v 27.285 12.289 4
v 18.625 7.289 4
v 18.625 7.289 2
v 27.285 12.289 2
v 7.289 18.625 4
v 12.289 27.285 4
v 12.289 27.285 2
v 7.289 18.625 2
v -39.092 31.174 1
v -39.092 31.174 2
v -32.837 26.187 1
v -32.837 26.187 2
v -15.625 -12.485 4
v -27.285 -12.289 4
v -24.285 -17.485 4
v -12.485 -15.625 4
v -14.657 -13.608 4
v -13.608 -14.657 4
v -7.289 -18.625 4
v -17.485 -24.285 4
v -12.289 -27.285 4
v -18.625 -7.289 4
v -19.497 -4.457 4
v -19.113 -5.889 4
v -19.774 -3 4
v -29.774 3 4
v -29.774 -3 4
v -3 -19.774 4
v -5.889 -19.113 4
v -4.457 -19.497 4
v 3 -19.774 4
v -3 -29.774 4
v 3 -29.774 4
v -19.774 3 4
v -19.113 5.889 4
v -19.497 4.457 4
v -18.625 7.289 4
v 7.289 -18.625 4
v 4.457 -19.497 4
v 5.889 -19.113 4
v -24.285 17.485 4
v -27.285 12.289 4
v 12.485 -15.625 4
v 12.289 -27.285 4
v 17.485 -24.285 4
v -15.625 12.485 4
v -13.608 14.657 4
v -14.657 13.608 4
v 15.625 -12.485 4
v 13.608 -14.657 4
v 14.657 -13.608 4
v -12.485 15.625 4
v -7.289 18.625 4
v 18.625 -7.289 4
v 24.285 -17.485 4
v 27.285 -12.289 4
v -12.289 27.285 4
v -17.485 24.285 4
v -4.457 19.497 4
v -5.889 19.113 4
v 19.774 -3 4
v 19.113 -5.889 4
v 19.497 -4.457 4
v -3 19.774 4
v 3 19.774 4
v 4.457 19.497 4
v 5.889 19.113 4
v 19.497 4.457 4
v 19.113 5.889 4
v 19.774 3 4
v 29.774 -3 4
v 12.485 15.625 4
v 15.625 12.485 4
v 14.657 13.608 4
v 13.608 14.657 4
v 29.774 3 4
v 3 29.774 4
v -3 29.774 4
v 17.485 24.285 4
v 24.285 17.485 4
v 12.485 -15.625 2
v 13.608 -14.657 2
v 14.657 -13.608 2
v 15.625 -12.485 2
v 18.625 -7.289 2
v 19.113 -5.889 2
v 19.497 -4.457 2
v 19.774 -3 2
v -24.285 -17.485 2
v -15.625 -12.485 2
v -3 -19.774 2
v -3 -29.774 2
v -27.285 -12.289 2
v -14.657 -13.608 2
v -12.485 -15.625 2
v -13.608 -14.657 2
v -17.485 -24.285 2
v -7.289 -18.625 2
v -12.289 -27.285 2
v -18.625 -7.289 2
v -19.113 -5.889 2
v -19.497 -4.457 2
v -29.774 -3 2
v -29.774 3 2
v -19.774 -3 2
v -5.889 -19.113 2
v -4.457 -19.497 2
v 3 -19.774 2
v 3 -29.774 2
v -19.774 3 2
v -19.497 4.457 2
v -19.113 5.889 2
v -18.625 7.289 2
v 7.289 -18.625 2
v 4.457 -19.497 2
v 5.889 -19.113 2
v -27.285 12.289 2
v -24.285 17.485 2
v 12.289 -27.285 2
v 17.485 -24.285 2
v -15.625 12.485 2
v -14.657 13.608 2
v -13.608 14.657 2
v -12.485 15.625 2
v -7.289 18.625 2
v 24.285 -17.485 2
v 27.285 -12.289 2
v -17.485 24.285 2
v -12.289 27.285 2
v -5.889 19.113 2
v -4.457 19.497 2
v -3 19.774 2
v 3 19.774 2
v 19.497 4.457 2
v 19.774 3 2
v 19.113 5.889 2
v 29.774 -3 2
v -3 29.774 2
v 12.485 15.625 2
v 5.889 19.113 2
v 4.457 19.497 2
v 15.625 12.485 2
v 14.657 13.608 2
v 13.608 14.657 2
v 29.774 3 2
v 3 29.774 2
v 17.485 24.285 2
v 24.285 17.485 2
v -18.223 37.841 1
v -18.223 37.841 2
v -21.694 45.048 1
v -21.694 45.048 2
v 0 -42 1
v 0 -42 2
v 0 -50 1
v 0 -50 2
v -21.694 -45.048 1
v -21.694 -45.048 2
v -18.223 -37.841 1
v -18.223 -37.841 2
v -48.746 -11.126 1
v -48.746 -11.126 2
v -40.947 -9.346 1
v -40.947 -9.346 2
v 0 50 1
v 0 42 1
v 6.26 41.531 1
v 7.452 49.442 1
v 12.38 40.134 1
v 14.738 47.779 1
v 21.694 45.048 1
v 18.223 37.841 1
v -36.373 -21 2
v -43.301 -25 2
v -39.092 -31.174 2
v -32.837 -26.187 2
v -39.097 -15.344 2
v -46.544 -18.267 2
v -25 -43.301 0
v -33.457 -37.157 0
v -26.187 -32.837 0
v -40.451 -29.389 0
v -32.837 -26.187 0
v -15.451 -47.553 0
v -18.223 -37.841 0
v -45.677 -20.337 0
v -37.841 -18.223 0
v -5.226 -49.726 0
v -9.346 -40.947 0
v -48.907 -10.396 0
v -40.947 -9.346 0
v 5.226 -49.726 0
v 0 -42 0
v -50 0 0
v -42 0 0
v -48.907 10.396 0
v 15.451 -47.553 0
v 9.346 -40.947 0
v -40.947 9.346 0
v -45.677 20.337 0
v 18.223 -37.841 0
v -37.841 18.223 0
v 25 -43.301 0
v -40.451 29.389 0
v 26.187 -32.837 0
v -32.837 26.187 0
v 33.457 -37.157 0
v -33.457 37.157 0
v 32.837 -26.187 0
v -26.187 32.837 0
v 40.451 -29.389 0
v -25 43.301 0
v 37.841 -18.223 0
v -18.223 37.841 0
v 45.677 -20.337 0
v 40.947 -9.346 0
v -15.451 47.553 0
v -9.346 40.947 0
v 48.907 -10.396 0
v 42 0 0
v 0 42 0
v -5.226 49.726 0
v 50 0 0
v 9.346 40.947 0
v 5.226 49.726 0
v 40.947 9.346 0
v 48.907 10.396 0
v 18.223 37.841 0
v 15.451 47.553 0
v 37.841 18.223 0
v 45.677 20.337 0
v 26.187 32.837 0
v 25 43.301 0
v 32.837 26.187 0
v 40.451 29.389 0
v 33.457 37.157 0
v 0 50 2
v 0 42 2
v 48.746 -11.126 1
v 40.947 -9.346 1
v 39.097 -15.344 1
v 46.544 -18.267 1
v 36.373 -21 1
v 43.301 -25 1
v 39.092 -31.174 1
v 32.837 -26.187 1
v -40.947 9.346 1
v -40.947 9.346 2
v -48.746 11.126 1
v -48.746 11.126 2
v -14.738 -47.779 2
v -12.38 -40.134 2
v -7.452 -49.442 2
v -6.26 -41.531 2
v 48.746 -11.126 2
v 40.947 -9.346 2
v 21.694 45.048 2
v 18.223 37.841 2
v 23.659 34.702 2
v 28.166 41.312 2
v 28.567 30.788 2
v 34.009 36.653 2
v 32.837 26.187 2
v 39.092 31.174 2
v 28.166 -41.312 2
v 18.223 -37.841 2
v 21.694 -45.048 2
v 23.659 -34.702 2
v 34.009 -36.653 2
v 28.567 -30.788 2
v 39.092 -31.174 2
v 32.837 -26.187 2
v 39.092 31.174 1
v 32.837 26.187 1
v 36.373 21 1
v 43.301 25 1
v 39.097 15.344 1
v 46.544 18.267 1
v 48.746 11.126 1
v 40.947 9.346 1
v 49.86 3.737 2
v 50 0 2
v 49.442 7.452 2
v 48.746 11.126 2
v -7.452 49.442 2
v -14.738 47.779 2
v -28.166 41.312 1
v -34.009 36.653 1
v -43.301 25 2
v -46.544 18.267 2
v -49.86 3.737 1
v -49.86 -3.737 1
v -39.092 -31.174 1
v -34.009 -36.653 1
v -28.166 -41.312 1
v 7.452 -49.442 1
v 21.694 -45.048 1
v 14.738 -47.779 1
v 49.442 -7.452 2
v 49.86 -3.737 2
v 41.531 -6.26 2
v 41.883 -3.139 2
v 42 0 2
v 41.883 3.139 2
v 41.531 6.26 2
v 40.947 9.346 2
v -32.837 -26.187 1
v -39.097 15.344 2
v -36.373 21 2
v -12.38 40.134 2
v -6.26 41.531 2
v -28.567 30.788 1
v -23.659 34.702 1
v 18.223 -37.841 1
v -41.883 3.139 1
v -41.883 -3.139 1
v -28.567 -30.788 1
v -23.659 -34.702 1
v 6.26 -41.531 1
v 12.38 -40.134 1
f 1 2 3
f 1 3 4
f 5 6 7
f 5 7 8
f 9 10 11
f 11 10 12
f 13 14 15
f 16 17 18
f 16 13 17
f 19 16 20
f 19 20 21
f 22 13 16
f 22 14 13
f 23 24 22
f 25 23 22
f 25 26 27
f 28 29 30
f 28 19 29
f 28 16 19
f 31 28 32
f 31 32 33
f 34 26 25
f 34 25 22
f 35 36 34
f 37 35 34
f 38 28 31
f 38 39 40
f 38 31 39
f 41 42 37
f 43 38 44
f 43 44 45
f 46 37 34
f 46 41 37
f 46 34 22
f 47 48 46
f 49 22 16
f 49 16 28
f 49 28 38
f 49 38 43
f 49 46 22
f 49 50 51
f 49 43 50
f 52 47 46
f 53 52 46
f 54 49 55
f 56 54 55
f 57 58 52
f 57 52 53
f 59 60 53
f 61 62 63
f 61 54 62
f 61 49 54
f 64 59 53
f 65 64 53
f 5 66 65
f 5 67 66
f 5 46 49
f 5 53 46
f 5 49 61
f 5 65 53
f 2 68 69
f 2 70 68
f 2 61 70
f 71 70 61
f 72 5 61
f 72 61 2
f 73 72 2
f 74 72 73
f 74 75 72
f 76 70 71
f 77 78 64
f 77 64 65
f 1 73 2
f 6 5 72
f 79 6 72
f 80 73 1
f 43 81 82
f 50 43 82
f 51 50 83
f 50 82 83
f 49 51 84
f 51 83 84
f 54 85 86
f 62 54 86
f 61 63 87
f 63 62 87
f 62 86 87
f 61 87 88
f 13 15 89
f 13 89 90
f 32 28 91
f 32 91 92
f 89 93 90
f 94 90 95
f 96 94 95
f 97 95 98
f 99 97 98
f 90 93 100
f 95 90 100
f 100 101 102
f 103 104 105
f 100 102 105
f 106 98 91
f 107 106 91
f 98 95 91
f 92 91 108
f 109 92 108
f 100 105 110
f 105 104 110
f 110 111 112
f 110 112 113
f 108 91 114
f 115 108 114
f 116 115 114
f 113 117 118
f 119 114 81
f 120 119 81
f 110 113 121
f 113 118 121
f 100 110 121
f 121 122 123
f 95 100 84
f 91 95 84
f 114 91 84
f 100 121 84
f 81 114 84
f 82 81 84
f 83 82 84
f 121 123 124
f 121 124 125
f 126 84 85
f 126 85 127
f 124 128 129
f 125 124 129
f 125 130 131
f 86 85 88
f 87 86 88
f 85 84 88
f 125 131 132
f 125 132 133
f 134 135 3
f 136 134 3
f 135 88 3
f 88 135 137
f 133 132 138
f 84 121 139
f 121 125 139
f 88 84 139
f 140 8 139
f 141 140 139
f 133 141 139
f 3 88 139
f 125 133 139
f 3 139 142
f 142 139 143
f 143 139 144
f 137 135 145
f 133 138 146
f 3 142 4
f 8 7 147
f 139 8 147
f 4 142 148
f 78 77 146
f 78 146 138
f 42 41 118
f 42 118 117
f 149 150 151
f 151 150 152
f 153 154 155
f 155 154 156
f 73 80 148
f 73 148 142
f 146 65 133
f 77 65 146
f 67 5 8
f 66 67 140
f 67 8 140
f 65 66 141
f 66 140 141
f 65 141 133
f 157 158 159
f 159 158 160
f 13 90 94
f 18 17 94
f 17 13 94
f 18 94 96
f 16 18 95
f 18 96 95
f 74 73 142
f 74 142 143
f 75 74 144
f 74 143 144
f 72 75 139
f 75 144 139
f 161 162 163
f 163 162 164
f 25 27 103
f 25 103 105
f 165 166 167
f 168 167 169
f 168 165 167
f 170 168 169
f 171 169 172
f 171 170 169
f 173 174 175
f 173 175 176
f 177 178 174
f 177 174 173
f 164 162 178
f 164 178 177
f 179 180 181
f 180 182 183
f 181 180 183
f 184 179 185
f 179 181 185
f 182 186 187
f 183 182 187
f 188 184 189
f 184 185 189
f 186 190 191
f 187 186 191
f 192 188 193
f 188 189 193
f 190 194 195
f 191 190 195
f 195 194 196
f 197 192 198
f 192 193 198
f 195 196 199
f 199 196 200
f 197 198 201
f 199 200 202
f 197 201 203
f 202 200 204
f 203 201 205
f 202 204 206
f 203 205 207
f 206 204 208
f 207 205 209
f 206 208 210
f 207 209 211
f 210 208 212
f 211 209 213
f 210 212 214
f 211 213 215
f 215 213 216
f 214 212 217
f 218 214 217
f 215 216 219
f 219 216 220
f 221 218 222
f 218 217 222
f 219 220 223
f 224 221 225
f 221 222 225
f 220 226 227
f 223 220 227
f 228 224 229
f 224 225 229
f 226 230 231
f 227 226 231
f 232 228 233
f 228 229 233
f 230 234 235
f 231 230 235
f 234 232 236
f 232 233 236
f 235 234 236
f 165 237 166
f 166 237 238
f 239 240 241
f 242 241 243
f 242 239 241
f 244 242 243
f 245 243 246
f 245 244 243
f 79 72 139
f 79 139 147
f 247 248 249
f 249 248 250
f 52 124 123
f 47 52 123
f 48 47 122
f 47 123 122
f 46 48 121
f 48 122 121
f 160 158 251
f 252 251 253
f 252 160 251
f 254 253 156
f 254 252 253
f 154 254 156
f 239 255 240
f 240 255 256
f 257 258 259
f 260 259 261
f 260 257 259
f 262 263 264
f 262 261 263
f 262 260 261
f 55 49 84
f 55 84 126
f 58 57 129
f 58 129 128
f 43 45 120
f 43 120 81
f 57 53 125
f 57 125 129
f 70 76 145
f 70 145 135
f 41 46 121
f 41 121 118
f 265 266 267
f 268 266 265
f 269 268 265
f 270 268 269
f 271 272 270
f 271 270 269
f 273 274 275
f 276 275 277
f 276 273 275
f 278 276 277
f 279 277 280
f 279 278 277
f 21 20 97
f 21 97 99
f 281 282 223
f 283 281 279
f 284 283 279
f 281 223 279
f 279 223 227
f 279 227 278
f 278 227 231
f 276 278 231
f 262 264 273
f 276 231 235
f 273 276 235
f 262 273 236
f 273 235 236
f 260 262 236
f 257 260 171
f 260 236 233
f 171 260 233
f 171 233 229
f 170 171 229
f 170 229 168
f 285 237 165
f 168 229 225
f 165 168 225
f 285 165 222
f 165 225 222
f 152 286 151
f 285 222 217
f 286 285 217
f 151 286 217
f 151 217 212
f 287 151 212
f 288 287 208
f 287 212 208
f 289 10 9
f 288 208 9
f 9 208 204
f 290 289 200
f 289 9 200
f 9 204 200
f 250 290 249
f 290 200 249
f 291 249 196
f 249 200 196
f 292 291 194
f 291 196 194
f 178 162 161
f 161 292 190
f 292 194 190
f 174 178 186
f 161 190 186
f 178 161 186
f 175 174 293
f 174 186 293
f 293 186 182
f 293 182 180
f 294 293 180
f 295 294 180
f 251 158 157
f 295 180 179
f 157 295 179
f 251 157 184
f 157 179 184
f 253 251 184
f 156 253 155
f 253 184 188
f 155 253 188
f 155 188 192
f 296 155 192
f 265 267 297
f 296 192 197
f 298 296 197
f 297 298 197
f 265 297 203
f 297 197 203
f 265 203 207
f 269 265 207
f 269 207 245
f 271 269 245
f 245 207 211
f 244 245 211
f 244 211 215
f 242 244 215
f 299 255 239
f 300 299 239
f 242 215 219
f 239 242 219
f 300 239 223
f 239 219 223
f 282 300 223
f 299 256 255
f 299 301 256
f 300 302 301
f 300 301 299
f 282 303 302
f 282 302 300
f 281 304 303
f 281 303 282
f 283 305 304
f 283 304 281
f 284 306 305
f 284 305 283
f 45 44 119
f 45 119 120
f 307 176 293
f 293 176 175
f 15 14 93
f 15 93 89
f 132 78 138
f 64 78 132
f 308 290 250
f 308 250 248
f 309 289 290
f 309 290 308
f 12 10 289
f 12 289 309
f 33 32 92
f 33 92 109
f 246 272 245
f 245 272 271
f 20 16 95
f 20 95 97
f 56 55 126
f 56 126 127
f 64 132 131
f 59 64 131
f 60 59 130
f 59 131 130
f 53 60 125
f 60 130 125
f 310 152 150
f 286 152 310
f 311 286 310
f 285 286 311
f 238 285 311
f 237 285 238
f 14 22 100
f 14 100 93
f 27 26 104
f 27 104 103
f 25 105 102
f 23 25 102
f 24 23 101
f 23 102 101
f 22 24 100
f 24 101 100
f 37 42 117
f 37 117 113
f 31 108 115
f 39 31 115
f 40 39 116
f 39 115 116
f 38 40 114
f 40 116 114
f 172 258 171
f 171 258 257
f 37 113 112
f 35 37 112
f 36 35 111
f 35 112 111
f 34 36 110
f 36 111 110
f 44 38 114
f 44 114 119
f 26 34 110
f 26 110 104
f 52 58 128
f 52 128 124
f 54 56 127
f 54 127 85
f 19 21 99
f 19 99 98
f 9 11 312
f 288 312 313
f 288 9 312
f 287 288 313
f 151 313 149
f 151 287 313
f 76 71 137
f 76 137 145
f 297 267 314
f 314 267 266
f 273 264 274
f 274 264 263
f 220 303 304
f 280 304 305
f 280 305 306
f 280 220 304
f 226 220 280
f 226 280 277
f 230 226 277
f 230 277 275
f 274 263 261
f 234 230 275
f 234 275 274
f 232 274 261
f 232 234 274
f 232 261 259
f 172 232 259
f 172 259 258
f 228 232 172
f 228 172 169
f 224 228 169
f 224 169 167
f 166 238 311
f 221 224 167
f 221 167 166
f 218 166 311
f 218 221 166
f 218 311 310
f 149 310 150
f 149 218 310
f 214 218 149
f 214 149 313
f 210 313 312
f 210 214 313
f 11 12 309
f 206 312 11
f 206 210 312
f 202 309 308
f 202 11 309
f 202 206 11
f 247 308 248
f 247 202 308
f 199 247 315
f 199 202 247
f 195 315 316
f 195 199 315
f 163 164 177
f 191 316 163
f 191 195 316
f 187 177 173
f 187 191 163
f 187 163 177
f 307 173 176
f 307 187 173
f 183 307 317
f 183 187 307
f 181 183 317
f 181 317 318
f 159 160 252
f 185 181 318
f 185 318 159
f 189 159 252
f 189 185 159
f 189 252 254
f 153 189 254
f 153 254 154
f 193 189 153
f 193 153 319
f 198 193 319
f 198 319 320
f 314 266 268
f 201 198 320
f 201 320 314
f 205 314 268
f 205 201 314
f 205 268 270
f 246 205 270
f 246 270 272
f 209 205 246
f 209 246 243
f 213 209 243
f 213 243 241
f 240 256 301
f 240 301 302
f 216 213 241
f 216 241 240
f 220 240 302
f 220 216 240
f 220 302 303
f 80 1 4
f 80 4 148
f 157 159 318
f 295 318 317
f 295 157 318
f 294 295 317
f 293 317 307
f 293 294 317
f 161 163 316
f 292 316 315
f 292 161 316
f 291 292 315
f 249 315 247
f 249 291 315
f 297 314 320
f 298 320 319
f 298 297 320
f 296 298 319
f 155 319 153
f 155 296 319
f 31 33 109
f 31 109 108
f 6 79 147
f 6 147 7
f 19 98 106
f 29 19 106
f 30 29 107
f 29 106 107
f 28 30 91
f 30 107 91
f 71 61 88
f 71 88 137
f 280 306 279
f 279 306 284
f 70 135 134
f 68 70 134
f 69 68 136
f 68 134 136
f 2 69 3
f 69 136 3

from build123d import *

# Parameters (mm, degrees)
SKETCH_1_R               = 50
SKETCH_1_R_2             = 42
EXTRUDE_1_DEPTH          = 2
CUT_EXTRUDE_1_DEPTH      = 1
PATTERN_CIRCULAR_1_COUNT = 7
SKETCH_3_R               = 20
EXTRUDE_2_DEPTH          = 2
EXTRUDE_3_DEPTH          = 2
PATTERN_CIRCULAR_2_COUNT = 12


with BuildPart() as part:
    # ｽｹｯﾁ1 → ﾎﾞｽ - 押し出し1 (new body)
    with BuildSketch(Plane.XY):
        Circle(SKETCH_1_R)
        Circle(SKETCH_1_R_2, mode=Mode.SUBTRACT)
    extrude(amount=EXTRUDE_1_DEPTH)

    # ｽｹｯﾁ2 → ｶｯﾄ - 押し出し1 (cut)
    with BuildSketch(Plane.XY.offset(2)):
        with BuildLine():
            Line((0, 50), (0, 42))
            ThreePointArc((0, 42), (9.345879226, 40.946972312), (18.223117043, 37.840692452))
            Line((18.223117043, 37.840692452), (21.694186956, 45.048443395))
            ThreePointArc((21.694186956, 45.048443395), (11.126046698, 48.746395609), (0, 50))
        make_face()
    cut_extrude_1 = extrude(amount=-CUT_EXTRUDE_1_DEPTH, mode=Mode.SUBTRACT)

    # 円形ﾊﾟﾀｰﾝ1: ｶｯﾄ - 押し出し1 ×7 about axis
    pattern_circular_1_axis = Axis((0, 0, 0), (0, 0, 1))
    for i in range(1, PATTERN_CIRCULAR_1_COUNT):
        add(cut_extrude_1.rotate(pattern_circular_1_axis, i * 360 / PATTERN_CIRCULAR_1_COUNT), mode=Mode.SUBTRACT)


with BuildPart() as body_2:
    # ｽｹｯﾁ3 → ﾎﾞｽ - 押し出し2 (new body)
    with BuildSketch(Plane.XY.offset(2)):
        Circle(SKETCH_3_R)
    extrude(amount=EXTRUDE_2_DEPTH)

    # ｽｹｯﾁ4 → ﾎﾞｽ - 押し出し3 (add)
    with BuildSketch(Plane.XY.offset(4)):
        with BuildLine():
            Line((3, 29.773719933), (-3, 29.773719933))
            Line((-3, 29.773719933), (-3, 19.773719933))
            ThreePointArc((-3, 19.773719933), (0, 20), (3, 19.773719933))
            Line((3, 19.773719933), (3, 29.773719933))
        make_face()
    extrude_3 = extrude(amount=-EXTRUDE_3_DEPTH)

    # 円形ﾊﾟﾀｰﾝ2: ﾎﾞｽ - 押し出し3 ×12 about axis
    pattern_circular_2_axis = Axis((0, 0, 0), (0, 0, 1))
    for i in range(1, PATTERN_CIRCULAR_2_COUNT):
        add(extrude_3.rotate(pattern_circular_2_axis, i * 360 / PATTERN_CIRCULAR_2_COUNT))


solid = Compound([part.part, body_2.part])
